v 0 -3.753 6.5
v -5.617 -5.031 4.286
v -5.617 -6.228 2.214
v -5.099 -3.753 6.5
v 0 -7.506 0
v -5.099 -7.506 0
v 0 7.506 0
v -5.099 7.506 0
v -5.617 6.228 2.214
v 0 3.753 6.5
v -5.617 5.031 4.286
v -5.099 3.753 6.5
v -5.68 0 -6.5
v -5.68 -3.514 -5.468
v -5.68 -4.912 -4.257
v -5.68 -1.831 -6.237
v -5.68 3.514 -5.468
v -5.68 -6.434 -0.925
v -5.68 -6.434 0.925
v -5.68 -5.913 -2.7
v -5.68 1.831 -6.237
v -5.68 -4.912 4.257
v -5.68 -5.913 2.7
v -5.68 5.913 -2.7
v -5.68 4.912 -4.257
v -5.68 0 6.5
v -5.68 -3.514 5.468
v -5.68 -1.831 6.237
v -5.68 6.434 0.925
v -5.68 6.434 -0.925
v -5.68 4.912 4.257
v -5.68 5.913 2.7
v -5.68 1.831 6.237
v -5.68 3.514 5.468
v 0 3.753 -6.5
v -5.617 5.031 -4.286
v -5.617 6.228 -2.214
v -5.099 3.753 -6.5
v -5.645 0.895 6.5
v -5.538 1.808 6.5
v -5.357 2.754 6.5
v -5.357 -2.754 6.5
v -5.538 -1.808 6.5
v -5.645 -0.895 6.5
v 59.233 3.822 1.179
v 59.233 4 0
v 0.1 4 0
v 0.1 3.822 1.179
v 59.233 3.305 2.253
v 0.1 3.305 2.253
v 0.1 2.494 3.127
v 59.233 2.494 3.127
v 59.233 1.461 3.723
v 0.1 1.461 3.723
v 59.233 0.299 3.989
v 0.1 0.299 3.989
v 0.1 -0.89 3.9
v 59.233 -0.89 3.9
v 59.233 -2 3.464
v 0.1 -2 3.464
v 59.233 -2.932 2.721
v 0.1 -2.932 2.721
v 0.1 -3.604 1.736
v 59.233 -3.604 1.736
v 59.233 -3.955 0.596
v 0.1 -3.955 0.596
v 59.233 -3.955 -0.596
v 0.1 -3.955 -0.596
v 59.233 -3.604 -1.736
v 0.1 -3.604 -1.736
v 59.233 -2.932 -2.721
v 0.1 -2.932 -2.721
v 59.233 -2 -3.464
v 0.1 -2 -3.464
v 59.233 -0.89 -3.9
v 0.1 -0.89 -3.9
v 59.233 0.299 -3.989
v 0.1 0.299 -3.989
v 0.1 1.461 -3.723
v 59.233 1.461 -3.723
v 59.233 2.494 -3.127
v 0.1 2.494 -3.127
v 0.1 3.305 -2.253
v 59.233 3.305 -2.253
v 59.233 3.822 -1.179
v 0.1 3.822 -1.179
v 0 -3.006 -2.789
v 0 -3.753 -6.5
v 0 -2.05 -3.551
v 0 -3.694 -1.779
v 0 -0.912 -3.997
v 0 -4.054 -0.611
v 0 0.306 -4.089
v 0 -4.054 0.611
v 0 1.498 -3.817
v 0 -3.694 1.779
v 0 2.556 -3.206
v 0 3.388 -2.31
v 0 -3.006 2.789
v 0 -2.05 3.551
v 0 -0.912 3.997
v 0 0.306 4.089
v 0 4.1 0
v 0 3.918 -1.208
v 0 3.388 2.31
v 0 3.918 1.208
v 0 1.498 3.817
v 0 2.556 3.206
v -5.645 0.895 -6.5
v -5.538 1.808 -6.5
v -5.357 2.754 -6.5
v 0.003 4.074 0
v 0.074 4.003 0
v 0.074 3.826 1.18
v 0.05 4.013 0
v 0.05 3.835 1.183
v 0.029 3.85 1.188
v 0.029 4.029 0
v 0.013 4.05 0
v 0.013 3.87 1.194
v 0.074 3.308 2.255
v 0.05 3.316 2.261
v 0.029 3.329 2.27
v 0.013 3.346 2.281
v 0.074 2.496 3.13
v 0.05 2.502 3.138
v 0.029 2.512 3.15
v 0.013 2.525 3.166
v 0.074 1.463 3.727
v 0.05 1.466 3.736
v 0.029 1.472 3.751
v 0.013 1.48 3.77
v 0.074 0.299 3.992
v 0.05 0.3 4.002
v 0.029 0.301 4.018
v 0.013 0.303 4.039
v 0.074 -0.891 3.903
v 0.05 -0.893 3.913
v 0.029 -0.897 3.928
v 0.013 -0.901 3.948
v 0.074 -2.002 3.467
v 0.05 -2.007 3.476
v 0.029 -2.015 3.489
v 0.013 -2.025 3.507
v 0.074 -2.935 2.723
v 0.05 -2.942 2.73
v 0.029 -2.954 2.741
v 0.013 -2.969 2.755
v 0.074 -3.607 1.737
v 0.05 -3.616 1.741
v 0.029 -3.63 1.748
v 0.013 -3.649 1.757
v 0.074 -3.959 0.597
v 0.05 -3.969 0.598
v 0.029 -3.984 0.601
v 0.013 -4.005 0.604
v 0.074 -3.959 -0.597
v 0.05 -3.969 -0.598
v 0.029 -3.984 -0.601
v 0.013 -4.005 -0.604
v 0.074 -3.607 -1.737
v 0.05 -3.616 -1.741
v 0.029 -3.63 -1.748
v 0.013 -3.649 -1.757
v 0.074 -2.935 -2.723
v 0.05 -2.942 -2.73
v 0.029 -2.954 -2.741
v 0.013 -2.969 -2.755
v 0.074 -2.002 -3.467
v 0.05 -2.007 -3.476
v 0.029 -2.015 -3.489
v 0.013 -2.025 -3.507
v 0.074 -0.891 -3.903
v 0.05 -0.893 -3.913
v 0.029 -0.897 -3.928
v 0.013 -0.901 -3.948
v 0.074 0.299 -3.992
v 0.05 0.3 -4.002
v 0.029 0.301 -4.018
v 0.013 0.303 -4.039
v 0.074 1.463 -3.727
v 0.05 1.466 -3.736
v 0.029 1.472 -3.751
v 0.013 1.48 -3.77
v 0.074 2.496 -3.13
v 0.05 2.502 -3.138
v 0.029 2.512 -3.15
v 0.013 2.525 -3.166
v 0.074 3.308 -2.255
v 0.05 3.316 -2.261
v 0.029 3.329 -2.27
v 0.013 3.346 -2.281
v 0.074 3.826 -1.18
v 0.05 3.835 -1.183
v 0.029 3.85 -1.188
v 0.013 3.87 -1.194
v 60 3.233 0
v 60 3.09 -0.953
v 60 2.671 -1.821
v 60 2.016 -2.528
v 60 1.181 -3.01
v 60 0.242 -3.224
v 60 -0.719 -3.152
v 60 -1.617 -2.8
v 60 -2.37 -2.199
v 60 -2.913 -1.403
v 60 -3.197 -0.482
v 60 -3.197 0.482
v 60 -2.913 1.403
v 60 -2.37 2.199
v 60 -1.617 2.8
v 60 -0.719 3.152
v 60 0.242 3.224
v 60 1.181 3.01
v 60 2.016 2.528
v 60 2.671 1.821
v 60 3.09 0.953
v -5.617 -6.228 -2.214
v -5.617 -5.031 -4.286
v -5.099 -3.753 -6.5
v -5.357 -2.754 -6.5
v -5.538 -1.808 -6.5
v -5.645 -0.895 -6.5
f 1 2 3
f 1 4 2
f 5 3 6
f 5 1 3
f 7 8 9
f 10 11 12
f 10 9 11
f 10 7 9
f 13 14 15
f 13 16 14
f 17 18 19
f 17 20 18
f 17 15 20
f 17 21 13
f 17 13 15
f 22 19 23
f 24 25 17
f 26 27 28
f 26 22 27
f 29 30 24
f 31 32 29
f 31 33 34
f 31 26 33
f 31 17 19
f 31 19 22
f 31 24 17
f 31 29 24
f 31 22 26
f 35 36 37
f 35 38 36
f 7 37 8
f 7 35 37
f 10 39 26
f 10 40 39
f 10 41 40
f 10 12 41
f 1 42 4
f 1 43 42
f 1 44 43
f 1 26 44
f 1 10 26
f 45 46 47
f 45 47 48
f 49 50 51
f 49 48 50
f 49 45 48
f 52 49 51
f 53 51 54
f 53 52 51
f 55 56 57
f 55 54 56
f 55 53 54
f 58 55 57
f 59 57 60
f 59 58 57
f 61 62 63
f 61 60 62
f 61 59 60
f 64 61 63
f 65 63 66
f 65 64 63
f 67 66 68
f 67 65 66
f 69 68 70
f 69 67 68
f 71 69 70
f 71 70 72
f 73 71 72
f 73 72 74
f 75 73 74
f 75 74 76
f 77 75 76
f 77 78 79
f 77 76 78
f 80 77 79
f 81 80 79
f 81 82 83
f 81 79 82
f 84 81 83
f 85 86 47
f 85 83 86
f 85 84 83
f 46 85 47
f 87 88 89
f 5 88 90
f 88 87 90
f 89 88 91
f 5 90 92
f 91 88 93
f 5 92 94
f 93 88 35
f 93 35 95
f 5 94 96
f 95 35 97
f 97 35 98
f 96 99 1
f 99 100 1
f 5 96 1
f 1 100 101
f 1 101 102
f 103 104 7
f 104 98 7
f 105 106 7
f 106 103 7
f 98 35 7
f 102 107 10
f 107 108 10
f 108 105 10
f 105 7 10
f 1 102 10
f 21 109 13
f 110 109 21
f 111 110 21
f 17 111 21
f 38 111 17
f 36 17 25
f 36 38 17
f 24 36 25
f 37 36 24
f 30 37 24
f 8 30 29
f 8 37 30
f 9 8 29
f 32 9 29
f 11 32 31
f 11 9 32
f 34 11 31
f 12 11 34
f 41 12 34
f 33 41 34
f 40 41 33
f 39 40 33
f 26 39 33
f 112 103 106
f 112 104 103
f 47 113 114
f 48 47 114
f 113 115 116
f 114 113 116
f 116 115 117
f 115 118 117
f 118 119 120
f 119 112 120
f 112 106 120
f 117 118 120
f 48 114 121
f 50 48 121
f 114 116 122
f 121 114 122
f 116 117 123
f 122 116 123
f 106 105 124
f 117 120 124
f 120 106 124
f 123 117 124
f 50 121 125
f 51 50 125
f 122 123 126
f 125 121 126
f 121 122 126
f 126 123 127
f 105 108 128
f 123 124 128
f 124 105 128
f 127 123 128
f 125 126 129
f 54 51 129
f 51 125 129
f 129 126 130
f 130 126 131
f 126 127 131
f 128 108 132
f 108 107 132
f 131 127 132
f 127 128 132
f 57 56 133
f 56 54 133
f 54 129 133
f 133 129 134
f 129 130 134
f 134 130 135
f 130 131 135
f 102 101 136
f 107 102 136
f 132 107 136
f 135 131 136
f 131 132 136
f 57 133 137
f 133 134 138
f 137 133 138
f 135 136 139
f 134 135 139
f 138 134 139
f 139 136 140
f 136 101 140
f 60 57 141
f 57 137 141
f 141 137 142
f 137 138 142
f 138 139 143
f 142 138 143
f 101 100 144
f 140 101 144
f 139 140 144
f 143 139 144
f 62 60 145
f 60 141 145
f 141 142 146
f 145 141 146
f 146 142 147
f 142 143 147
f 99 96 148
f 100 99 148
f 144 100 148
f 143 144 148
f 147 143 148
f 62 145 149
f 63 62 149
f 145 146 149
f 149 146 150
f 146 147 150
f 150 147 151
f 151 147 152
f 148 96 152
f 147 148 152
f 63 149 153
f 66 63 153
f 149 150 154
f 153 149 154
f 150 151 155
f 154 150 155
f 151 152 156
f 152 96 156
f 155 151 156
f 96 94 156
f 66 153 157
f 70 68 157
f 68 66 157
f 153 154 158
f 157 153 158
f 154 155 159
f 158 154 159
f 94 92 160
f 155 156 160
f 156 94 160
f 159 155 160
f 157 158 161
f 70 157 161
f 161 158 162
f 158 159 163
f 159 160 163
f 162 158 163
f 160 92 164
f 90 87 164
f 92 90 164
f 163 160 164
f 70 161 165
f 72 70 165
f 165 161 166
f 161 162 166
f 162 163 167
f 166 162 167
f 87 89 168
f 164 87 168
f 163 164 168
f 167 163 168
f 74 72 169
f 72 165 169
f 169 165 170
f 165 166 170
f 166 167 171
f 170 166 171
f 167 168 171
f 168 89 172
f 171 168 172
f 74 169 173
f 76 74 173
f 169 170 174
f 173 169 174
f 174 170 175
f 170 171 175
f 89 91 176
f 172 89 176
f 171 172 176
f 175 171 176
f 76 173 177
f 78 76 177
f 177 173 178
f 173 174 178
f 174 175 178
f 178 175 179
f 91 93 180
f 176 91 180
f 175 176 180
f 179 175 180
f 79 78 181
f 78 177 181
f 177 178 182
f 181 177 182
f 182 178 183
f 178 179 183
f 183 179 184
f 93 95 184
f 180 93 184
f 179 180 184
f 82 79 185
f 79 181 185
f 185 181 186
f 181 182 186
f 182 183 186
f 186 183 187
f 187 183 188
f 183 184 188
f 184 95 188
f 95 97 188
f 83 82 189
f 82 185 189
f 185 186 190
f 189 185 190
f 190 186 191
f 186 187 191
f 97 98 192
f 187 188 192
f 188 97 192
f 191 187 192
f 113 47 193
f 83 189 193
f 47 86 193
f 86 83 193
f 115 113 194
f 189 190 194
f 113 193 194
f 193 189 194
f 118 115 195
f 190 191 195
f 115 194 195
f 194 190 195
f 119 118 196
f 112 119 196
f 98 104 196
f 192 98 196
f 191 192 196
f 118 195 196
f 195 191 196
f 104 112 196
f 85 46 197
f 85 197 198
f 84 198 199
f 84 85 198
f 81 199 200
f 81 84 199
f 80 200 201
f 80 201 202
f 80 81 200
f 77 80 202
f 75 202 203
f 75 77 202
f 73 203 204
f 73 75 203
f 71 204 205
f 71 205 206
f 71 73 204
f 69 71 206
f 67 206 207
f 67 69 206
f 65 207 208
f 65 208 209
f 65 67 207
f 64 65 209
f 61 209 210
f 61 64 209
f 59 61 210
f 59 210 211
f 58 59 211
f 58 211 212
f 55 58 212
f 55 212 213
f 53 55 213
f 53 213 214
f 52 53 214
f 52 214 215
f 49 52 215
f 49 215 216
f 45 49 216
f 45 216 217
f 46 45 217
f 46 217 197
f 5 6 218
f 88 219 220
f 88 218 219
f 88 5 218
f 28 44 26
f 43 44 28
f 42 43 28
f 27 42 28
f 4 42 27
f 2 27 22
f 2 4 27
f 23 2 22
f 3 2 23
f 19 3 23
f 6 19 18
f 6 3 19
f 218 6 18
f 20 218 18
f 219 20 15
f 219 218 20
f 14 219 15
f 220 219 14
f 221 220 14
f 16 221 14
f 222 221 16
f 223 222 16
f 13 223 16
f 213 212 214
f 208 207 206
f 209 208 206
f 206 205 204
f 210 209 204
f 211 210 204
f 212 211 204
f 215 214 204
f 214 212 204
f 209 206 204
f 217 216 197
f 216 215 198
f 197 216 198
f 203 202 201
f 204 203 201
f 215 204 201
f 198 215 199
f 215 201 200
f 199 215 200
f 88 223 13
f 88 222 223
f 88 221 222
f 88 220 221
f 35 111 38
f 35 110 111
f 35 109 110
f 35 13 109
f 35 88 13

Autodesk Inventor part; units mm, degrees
ref_plane "YZ Plane" through (0, 0, 0) normal (1, 0, 0) x (0, 1, 0)
ref_plane "XZ Plane" through (0, 0, 0) normal (0, 1, 0) x (-1, 0, 0)
sketch "Sketch1" plane through (0, 0, 0) normal (0, 0, 1) x (1, 0, 0)
  line L0 (0, 4) -> (60, 4)
  line L1 (60, 4) -> (60, 0)
  line L2 (60, 0) -> (0, 0)
  line L3 (-12, 0) -> (72, 0) projected
  line L4 (0, -0.8) -> (0, 4.8) projected
  line L5 (0, 4) -> (0, 0)
  dimension "d2" = 8
  dimension "d59" = 60
revolve "Body" add sketch "Sketch1" angle 360 about axis through (60, 0, 0) along (-1, 0, 0)
sketch "Sketch2" plane through (0, 0, 0) normal (-1, 0, 0) x (0, 0, 1)
  line L0 (0, 7.5056) -> (6.5, 3.7528)
  line L1 (6.5, 3.7528) -> (6.5, -3.7528)
  line L2 (6.5, -3.7528) -> (0, -7.5056)
  line L3 (0, -7.5056) -> (-6.5, -3.7528)
  line L4 (-6.5, -3.7528) -> (-6.5, 3.7528)
  line L5 (-6.5, 3.7528) -> (0, 7.5056)
  line L6 (-9.1, 0) -> (9.1, 0) projected
  line L7 (0, 10.5078) -> (0, -10.5078) projected
  point P0 (0, 0)
  point P1 (0, 0)
  dimension "d11" = 13
extrude "Head" add sketch "Sketch2" along normal blind 5.68
sketch "Sketch4" plane through (0, 0, 0) normal (0, 0, 1) x (1, 0, 0)
  line L0 (-4.9294, 7.8) -> (-5.68, 6.5)
  line L1 (-1.1, 0) -> (-0.234, 0)
  line L2 (-6.7692, 0) -> (0.8552, 0) projected
  line L3 (-5.68, 7.8) -> (-4.9294, 7.8)
  line L4 (-5.68, 6.5) -> (-5.68, 7.8)
  line L5 (0, 9.36) -> (0, -1.56) projected
  dimension "d65" = 13
  dimension "d67" = 30
  dimension "d68" = 15.6
  dimension "d69" = 5.68
revolve "Chamfer1" cut sketch "Sketch4" angle 360 about axis through (-1.1, 0, 0) along (1, 0, 0)
thread "Thread" size "M8x1.25" class "6g" standard "ISO Metric profile" length 22
chamfer "Chamfer2" distance 0.7668 distance2 0.7669 1 edges at (60, -4, 0) measured on face at (60, -0.1514, -1.2467)
fillet "Fillet" radius 0.1 1 edges at (0, -4, 0)
ref_plane "Work Plane1" through (1.525, 0, 0) normal (0, 0, 1) x (1, 0, 0)
equation "\"d2\" = GD"
equation "\"d59\" = NLG"
equation "\"d11\" = SW"
equation "\"d3\" = KOH"
equation "\"d15\" = GEL"
equation "\"d6\" = -0.5 * SPD + 0.5 * GD"
equation "\"d71\" = RR"
equation "\"d65\" = SW"
equation "\"d67\" = ANG1"
equation "\"d68\" = 1.2 * SW"
equation "\"d69\" = KOH"
equation "\"NLG\" = 60"
equation "\"GD\" = NND"
equation "\"BDM\" = NND"
equation "\"KOH\" = 5.68"
equation "\"GEL\" = 22"
equation "\"SW\" = 13"
equation "\"SW0\" = SW"
equation "\"SPD\" = NND - 1.2269 * PTC"
equation "\"SD2\" = NND"
equation "\"SD\" = 0"
equation "\"ANG1\" = 30deg"
equation "\"GAL\" = 0.61345 * PTC"
equation "\"GUL\" = 0.61345 * PTC"
equation "\"RR\" = 0.1"
equation "\"RR1\" = 0.4"
equation "\"GD1\" = THREADDIA - 1.2269 * PTC"
equation "\"THREADDIA\" = 8"
equation "\"TOA\" = 30deg"
equation "\"PTC\" = 1.25"
equation "\"KOH1\" = 3.7"
equation "\"NND\" = 8"
equation "\"E0\" = 1.155 * SW"
properties part number "ANSI B18.2.3.5M - M8 x 1.25 x 60" material "Steel, Mild"
